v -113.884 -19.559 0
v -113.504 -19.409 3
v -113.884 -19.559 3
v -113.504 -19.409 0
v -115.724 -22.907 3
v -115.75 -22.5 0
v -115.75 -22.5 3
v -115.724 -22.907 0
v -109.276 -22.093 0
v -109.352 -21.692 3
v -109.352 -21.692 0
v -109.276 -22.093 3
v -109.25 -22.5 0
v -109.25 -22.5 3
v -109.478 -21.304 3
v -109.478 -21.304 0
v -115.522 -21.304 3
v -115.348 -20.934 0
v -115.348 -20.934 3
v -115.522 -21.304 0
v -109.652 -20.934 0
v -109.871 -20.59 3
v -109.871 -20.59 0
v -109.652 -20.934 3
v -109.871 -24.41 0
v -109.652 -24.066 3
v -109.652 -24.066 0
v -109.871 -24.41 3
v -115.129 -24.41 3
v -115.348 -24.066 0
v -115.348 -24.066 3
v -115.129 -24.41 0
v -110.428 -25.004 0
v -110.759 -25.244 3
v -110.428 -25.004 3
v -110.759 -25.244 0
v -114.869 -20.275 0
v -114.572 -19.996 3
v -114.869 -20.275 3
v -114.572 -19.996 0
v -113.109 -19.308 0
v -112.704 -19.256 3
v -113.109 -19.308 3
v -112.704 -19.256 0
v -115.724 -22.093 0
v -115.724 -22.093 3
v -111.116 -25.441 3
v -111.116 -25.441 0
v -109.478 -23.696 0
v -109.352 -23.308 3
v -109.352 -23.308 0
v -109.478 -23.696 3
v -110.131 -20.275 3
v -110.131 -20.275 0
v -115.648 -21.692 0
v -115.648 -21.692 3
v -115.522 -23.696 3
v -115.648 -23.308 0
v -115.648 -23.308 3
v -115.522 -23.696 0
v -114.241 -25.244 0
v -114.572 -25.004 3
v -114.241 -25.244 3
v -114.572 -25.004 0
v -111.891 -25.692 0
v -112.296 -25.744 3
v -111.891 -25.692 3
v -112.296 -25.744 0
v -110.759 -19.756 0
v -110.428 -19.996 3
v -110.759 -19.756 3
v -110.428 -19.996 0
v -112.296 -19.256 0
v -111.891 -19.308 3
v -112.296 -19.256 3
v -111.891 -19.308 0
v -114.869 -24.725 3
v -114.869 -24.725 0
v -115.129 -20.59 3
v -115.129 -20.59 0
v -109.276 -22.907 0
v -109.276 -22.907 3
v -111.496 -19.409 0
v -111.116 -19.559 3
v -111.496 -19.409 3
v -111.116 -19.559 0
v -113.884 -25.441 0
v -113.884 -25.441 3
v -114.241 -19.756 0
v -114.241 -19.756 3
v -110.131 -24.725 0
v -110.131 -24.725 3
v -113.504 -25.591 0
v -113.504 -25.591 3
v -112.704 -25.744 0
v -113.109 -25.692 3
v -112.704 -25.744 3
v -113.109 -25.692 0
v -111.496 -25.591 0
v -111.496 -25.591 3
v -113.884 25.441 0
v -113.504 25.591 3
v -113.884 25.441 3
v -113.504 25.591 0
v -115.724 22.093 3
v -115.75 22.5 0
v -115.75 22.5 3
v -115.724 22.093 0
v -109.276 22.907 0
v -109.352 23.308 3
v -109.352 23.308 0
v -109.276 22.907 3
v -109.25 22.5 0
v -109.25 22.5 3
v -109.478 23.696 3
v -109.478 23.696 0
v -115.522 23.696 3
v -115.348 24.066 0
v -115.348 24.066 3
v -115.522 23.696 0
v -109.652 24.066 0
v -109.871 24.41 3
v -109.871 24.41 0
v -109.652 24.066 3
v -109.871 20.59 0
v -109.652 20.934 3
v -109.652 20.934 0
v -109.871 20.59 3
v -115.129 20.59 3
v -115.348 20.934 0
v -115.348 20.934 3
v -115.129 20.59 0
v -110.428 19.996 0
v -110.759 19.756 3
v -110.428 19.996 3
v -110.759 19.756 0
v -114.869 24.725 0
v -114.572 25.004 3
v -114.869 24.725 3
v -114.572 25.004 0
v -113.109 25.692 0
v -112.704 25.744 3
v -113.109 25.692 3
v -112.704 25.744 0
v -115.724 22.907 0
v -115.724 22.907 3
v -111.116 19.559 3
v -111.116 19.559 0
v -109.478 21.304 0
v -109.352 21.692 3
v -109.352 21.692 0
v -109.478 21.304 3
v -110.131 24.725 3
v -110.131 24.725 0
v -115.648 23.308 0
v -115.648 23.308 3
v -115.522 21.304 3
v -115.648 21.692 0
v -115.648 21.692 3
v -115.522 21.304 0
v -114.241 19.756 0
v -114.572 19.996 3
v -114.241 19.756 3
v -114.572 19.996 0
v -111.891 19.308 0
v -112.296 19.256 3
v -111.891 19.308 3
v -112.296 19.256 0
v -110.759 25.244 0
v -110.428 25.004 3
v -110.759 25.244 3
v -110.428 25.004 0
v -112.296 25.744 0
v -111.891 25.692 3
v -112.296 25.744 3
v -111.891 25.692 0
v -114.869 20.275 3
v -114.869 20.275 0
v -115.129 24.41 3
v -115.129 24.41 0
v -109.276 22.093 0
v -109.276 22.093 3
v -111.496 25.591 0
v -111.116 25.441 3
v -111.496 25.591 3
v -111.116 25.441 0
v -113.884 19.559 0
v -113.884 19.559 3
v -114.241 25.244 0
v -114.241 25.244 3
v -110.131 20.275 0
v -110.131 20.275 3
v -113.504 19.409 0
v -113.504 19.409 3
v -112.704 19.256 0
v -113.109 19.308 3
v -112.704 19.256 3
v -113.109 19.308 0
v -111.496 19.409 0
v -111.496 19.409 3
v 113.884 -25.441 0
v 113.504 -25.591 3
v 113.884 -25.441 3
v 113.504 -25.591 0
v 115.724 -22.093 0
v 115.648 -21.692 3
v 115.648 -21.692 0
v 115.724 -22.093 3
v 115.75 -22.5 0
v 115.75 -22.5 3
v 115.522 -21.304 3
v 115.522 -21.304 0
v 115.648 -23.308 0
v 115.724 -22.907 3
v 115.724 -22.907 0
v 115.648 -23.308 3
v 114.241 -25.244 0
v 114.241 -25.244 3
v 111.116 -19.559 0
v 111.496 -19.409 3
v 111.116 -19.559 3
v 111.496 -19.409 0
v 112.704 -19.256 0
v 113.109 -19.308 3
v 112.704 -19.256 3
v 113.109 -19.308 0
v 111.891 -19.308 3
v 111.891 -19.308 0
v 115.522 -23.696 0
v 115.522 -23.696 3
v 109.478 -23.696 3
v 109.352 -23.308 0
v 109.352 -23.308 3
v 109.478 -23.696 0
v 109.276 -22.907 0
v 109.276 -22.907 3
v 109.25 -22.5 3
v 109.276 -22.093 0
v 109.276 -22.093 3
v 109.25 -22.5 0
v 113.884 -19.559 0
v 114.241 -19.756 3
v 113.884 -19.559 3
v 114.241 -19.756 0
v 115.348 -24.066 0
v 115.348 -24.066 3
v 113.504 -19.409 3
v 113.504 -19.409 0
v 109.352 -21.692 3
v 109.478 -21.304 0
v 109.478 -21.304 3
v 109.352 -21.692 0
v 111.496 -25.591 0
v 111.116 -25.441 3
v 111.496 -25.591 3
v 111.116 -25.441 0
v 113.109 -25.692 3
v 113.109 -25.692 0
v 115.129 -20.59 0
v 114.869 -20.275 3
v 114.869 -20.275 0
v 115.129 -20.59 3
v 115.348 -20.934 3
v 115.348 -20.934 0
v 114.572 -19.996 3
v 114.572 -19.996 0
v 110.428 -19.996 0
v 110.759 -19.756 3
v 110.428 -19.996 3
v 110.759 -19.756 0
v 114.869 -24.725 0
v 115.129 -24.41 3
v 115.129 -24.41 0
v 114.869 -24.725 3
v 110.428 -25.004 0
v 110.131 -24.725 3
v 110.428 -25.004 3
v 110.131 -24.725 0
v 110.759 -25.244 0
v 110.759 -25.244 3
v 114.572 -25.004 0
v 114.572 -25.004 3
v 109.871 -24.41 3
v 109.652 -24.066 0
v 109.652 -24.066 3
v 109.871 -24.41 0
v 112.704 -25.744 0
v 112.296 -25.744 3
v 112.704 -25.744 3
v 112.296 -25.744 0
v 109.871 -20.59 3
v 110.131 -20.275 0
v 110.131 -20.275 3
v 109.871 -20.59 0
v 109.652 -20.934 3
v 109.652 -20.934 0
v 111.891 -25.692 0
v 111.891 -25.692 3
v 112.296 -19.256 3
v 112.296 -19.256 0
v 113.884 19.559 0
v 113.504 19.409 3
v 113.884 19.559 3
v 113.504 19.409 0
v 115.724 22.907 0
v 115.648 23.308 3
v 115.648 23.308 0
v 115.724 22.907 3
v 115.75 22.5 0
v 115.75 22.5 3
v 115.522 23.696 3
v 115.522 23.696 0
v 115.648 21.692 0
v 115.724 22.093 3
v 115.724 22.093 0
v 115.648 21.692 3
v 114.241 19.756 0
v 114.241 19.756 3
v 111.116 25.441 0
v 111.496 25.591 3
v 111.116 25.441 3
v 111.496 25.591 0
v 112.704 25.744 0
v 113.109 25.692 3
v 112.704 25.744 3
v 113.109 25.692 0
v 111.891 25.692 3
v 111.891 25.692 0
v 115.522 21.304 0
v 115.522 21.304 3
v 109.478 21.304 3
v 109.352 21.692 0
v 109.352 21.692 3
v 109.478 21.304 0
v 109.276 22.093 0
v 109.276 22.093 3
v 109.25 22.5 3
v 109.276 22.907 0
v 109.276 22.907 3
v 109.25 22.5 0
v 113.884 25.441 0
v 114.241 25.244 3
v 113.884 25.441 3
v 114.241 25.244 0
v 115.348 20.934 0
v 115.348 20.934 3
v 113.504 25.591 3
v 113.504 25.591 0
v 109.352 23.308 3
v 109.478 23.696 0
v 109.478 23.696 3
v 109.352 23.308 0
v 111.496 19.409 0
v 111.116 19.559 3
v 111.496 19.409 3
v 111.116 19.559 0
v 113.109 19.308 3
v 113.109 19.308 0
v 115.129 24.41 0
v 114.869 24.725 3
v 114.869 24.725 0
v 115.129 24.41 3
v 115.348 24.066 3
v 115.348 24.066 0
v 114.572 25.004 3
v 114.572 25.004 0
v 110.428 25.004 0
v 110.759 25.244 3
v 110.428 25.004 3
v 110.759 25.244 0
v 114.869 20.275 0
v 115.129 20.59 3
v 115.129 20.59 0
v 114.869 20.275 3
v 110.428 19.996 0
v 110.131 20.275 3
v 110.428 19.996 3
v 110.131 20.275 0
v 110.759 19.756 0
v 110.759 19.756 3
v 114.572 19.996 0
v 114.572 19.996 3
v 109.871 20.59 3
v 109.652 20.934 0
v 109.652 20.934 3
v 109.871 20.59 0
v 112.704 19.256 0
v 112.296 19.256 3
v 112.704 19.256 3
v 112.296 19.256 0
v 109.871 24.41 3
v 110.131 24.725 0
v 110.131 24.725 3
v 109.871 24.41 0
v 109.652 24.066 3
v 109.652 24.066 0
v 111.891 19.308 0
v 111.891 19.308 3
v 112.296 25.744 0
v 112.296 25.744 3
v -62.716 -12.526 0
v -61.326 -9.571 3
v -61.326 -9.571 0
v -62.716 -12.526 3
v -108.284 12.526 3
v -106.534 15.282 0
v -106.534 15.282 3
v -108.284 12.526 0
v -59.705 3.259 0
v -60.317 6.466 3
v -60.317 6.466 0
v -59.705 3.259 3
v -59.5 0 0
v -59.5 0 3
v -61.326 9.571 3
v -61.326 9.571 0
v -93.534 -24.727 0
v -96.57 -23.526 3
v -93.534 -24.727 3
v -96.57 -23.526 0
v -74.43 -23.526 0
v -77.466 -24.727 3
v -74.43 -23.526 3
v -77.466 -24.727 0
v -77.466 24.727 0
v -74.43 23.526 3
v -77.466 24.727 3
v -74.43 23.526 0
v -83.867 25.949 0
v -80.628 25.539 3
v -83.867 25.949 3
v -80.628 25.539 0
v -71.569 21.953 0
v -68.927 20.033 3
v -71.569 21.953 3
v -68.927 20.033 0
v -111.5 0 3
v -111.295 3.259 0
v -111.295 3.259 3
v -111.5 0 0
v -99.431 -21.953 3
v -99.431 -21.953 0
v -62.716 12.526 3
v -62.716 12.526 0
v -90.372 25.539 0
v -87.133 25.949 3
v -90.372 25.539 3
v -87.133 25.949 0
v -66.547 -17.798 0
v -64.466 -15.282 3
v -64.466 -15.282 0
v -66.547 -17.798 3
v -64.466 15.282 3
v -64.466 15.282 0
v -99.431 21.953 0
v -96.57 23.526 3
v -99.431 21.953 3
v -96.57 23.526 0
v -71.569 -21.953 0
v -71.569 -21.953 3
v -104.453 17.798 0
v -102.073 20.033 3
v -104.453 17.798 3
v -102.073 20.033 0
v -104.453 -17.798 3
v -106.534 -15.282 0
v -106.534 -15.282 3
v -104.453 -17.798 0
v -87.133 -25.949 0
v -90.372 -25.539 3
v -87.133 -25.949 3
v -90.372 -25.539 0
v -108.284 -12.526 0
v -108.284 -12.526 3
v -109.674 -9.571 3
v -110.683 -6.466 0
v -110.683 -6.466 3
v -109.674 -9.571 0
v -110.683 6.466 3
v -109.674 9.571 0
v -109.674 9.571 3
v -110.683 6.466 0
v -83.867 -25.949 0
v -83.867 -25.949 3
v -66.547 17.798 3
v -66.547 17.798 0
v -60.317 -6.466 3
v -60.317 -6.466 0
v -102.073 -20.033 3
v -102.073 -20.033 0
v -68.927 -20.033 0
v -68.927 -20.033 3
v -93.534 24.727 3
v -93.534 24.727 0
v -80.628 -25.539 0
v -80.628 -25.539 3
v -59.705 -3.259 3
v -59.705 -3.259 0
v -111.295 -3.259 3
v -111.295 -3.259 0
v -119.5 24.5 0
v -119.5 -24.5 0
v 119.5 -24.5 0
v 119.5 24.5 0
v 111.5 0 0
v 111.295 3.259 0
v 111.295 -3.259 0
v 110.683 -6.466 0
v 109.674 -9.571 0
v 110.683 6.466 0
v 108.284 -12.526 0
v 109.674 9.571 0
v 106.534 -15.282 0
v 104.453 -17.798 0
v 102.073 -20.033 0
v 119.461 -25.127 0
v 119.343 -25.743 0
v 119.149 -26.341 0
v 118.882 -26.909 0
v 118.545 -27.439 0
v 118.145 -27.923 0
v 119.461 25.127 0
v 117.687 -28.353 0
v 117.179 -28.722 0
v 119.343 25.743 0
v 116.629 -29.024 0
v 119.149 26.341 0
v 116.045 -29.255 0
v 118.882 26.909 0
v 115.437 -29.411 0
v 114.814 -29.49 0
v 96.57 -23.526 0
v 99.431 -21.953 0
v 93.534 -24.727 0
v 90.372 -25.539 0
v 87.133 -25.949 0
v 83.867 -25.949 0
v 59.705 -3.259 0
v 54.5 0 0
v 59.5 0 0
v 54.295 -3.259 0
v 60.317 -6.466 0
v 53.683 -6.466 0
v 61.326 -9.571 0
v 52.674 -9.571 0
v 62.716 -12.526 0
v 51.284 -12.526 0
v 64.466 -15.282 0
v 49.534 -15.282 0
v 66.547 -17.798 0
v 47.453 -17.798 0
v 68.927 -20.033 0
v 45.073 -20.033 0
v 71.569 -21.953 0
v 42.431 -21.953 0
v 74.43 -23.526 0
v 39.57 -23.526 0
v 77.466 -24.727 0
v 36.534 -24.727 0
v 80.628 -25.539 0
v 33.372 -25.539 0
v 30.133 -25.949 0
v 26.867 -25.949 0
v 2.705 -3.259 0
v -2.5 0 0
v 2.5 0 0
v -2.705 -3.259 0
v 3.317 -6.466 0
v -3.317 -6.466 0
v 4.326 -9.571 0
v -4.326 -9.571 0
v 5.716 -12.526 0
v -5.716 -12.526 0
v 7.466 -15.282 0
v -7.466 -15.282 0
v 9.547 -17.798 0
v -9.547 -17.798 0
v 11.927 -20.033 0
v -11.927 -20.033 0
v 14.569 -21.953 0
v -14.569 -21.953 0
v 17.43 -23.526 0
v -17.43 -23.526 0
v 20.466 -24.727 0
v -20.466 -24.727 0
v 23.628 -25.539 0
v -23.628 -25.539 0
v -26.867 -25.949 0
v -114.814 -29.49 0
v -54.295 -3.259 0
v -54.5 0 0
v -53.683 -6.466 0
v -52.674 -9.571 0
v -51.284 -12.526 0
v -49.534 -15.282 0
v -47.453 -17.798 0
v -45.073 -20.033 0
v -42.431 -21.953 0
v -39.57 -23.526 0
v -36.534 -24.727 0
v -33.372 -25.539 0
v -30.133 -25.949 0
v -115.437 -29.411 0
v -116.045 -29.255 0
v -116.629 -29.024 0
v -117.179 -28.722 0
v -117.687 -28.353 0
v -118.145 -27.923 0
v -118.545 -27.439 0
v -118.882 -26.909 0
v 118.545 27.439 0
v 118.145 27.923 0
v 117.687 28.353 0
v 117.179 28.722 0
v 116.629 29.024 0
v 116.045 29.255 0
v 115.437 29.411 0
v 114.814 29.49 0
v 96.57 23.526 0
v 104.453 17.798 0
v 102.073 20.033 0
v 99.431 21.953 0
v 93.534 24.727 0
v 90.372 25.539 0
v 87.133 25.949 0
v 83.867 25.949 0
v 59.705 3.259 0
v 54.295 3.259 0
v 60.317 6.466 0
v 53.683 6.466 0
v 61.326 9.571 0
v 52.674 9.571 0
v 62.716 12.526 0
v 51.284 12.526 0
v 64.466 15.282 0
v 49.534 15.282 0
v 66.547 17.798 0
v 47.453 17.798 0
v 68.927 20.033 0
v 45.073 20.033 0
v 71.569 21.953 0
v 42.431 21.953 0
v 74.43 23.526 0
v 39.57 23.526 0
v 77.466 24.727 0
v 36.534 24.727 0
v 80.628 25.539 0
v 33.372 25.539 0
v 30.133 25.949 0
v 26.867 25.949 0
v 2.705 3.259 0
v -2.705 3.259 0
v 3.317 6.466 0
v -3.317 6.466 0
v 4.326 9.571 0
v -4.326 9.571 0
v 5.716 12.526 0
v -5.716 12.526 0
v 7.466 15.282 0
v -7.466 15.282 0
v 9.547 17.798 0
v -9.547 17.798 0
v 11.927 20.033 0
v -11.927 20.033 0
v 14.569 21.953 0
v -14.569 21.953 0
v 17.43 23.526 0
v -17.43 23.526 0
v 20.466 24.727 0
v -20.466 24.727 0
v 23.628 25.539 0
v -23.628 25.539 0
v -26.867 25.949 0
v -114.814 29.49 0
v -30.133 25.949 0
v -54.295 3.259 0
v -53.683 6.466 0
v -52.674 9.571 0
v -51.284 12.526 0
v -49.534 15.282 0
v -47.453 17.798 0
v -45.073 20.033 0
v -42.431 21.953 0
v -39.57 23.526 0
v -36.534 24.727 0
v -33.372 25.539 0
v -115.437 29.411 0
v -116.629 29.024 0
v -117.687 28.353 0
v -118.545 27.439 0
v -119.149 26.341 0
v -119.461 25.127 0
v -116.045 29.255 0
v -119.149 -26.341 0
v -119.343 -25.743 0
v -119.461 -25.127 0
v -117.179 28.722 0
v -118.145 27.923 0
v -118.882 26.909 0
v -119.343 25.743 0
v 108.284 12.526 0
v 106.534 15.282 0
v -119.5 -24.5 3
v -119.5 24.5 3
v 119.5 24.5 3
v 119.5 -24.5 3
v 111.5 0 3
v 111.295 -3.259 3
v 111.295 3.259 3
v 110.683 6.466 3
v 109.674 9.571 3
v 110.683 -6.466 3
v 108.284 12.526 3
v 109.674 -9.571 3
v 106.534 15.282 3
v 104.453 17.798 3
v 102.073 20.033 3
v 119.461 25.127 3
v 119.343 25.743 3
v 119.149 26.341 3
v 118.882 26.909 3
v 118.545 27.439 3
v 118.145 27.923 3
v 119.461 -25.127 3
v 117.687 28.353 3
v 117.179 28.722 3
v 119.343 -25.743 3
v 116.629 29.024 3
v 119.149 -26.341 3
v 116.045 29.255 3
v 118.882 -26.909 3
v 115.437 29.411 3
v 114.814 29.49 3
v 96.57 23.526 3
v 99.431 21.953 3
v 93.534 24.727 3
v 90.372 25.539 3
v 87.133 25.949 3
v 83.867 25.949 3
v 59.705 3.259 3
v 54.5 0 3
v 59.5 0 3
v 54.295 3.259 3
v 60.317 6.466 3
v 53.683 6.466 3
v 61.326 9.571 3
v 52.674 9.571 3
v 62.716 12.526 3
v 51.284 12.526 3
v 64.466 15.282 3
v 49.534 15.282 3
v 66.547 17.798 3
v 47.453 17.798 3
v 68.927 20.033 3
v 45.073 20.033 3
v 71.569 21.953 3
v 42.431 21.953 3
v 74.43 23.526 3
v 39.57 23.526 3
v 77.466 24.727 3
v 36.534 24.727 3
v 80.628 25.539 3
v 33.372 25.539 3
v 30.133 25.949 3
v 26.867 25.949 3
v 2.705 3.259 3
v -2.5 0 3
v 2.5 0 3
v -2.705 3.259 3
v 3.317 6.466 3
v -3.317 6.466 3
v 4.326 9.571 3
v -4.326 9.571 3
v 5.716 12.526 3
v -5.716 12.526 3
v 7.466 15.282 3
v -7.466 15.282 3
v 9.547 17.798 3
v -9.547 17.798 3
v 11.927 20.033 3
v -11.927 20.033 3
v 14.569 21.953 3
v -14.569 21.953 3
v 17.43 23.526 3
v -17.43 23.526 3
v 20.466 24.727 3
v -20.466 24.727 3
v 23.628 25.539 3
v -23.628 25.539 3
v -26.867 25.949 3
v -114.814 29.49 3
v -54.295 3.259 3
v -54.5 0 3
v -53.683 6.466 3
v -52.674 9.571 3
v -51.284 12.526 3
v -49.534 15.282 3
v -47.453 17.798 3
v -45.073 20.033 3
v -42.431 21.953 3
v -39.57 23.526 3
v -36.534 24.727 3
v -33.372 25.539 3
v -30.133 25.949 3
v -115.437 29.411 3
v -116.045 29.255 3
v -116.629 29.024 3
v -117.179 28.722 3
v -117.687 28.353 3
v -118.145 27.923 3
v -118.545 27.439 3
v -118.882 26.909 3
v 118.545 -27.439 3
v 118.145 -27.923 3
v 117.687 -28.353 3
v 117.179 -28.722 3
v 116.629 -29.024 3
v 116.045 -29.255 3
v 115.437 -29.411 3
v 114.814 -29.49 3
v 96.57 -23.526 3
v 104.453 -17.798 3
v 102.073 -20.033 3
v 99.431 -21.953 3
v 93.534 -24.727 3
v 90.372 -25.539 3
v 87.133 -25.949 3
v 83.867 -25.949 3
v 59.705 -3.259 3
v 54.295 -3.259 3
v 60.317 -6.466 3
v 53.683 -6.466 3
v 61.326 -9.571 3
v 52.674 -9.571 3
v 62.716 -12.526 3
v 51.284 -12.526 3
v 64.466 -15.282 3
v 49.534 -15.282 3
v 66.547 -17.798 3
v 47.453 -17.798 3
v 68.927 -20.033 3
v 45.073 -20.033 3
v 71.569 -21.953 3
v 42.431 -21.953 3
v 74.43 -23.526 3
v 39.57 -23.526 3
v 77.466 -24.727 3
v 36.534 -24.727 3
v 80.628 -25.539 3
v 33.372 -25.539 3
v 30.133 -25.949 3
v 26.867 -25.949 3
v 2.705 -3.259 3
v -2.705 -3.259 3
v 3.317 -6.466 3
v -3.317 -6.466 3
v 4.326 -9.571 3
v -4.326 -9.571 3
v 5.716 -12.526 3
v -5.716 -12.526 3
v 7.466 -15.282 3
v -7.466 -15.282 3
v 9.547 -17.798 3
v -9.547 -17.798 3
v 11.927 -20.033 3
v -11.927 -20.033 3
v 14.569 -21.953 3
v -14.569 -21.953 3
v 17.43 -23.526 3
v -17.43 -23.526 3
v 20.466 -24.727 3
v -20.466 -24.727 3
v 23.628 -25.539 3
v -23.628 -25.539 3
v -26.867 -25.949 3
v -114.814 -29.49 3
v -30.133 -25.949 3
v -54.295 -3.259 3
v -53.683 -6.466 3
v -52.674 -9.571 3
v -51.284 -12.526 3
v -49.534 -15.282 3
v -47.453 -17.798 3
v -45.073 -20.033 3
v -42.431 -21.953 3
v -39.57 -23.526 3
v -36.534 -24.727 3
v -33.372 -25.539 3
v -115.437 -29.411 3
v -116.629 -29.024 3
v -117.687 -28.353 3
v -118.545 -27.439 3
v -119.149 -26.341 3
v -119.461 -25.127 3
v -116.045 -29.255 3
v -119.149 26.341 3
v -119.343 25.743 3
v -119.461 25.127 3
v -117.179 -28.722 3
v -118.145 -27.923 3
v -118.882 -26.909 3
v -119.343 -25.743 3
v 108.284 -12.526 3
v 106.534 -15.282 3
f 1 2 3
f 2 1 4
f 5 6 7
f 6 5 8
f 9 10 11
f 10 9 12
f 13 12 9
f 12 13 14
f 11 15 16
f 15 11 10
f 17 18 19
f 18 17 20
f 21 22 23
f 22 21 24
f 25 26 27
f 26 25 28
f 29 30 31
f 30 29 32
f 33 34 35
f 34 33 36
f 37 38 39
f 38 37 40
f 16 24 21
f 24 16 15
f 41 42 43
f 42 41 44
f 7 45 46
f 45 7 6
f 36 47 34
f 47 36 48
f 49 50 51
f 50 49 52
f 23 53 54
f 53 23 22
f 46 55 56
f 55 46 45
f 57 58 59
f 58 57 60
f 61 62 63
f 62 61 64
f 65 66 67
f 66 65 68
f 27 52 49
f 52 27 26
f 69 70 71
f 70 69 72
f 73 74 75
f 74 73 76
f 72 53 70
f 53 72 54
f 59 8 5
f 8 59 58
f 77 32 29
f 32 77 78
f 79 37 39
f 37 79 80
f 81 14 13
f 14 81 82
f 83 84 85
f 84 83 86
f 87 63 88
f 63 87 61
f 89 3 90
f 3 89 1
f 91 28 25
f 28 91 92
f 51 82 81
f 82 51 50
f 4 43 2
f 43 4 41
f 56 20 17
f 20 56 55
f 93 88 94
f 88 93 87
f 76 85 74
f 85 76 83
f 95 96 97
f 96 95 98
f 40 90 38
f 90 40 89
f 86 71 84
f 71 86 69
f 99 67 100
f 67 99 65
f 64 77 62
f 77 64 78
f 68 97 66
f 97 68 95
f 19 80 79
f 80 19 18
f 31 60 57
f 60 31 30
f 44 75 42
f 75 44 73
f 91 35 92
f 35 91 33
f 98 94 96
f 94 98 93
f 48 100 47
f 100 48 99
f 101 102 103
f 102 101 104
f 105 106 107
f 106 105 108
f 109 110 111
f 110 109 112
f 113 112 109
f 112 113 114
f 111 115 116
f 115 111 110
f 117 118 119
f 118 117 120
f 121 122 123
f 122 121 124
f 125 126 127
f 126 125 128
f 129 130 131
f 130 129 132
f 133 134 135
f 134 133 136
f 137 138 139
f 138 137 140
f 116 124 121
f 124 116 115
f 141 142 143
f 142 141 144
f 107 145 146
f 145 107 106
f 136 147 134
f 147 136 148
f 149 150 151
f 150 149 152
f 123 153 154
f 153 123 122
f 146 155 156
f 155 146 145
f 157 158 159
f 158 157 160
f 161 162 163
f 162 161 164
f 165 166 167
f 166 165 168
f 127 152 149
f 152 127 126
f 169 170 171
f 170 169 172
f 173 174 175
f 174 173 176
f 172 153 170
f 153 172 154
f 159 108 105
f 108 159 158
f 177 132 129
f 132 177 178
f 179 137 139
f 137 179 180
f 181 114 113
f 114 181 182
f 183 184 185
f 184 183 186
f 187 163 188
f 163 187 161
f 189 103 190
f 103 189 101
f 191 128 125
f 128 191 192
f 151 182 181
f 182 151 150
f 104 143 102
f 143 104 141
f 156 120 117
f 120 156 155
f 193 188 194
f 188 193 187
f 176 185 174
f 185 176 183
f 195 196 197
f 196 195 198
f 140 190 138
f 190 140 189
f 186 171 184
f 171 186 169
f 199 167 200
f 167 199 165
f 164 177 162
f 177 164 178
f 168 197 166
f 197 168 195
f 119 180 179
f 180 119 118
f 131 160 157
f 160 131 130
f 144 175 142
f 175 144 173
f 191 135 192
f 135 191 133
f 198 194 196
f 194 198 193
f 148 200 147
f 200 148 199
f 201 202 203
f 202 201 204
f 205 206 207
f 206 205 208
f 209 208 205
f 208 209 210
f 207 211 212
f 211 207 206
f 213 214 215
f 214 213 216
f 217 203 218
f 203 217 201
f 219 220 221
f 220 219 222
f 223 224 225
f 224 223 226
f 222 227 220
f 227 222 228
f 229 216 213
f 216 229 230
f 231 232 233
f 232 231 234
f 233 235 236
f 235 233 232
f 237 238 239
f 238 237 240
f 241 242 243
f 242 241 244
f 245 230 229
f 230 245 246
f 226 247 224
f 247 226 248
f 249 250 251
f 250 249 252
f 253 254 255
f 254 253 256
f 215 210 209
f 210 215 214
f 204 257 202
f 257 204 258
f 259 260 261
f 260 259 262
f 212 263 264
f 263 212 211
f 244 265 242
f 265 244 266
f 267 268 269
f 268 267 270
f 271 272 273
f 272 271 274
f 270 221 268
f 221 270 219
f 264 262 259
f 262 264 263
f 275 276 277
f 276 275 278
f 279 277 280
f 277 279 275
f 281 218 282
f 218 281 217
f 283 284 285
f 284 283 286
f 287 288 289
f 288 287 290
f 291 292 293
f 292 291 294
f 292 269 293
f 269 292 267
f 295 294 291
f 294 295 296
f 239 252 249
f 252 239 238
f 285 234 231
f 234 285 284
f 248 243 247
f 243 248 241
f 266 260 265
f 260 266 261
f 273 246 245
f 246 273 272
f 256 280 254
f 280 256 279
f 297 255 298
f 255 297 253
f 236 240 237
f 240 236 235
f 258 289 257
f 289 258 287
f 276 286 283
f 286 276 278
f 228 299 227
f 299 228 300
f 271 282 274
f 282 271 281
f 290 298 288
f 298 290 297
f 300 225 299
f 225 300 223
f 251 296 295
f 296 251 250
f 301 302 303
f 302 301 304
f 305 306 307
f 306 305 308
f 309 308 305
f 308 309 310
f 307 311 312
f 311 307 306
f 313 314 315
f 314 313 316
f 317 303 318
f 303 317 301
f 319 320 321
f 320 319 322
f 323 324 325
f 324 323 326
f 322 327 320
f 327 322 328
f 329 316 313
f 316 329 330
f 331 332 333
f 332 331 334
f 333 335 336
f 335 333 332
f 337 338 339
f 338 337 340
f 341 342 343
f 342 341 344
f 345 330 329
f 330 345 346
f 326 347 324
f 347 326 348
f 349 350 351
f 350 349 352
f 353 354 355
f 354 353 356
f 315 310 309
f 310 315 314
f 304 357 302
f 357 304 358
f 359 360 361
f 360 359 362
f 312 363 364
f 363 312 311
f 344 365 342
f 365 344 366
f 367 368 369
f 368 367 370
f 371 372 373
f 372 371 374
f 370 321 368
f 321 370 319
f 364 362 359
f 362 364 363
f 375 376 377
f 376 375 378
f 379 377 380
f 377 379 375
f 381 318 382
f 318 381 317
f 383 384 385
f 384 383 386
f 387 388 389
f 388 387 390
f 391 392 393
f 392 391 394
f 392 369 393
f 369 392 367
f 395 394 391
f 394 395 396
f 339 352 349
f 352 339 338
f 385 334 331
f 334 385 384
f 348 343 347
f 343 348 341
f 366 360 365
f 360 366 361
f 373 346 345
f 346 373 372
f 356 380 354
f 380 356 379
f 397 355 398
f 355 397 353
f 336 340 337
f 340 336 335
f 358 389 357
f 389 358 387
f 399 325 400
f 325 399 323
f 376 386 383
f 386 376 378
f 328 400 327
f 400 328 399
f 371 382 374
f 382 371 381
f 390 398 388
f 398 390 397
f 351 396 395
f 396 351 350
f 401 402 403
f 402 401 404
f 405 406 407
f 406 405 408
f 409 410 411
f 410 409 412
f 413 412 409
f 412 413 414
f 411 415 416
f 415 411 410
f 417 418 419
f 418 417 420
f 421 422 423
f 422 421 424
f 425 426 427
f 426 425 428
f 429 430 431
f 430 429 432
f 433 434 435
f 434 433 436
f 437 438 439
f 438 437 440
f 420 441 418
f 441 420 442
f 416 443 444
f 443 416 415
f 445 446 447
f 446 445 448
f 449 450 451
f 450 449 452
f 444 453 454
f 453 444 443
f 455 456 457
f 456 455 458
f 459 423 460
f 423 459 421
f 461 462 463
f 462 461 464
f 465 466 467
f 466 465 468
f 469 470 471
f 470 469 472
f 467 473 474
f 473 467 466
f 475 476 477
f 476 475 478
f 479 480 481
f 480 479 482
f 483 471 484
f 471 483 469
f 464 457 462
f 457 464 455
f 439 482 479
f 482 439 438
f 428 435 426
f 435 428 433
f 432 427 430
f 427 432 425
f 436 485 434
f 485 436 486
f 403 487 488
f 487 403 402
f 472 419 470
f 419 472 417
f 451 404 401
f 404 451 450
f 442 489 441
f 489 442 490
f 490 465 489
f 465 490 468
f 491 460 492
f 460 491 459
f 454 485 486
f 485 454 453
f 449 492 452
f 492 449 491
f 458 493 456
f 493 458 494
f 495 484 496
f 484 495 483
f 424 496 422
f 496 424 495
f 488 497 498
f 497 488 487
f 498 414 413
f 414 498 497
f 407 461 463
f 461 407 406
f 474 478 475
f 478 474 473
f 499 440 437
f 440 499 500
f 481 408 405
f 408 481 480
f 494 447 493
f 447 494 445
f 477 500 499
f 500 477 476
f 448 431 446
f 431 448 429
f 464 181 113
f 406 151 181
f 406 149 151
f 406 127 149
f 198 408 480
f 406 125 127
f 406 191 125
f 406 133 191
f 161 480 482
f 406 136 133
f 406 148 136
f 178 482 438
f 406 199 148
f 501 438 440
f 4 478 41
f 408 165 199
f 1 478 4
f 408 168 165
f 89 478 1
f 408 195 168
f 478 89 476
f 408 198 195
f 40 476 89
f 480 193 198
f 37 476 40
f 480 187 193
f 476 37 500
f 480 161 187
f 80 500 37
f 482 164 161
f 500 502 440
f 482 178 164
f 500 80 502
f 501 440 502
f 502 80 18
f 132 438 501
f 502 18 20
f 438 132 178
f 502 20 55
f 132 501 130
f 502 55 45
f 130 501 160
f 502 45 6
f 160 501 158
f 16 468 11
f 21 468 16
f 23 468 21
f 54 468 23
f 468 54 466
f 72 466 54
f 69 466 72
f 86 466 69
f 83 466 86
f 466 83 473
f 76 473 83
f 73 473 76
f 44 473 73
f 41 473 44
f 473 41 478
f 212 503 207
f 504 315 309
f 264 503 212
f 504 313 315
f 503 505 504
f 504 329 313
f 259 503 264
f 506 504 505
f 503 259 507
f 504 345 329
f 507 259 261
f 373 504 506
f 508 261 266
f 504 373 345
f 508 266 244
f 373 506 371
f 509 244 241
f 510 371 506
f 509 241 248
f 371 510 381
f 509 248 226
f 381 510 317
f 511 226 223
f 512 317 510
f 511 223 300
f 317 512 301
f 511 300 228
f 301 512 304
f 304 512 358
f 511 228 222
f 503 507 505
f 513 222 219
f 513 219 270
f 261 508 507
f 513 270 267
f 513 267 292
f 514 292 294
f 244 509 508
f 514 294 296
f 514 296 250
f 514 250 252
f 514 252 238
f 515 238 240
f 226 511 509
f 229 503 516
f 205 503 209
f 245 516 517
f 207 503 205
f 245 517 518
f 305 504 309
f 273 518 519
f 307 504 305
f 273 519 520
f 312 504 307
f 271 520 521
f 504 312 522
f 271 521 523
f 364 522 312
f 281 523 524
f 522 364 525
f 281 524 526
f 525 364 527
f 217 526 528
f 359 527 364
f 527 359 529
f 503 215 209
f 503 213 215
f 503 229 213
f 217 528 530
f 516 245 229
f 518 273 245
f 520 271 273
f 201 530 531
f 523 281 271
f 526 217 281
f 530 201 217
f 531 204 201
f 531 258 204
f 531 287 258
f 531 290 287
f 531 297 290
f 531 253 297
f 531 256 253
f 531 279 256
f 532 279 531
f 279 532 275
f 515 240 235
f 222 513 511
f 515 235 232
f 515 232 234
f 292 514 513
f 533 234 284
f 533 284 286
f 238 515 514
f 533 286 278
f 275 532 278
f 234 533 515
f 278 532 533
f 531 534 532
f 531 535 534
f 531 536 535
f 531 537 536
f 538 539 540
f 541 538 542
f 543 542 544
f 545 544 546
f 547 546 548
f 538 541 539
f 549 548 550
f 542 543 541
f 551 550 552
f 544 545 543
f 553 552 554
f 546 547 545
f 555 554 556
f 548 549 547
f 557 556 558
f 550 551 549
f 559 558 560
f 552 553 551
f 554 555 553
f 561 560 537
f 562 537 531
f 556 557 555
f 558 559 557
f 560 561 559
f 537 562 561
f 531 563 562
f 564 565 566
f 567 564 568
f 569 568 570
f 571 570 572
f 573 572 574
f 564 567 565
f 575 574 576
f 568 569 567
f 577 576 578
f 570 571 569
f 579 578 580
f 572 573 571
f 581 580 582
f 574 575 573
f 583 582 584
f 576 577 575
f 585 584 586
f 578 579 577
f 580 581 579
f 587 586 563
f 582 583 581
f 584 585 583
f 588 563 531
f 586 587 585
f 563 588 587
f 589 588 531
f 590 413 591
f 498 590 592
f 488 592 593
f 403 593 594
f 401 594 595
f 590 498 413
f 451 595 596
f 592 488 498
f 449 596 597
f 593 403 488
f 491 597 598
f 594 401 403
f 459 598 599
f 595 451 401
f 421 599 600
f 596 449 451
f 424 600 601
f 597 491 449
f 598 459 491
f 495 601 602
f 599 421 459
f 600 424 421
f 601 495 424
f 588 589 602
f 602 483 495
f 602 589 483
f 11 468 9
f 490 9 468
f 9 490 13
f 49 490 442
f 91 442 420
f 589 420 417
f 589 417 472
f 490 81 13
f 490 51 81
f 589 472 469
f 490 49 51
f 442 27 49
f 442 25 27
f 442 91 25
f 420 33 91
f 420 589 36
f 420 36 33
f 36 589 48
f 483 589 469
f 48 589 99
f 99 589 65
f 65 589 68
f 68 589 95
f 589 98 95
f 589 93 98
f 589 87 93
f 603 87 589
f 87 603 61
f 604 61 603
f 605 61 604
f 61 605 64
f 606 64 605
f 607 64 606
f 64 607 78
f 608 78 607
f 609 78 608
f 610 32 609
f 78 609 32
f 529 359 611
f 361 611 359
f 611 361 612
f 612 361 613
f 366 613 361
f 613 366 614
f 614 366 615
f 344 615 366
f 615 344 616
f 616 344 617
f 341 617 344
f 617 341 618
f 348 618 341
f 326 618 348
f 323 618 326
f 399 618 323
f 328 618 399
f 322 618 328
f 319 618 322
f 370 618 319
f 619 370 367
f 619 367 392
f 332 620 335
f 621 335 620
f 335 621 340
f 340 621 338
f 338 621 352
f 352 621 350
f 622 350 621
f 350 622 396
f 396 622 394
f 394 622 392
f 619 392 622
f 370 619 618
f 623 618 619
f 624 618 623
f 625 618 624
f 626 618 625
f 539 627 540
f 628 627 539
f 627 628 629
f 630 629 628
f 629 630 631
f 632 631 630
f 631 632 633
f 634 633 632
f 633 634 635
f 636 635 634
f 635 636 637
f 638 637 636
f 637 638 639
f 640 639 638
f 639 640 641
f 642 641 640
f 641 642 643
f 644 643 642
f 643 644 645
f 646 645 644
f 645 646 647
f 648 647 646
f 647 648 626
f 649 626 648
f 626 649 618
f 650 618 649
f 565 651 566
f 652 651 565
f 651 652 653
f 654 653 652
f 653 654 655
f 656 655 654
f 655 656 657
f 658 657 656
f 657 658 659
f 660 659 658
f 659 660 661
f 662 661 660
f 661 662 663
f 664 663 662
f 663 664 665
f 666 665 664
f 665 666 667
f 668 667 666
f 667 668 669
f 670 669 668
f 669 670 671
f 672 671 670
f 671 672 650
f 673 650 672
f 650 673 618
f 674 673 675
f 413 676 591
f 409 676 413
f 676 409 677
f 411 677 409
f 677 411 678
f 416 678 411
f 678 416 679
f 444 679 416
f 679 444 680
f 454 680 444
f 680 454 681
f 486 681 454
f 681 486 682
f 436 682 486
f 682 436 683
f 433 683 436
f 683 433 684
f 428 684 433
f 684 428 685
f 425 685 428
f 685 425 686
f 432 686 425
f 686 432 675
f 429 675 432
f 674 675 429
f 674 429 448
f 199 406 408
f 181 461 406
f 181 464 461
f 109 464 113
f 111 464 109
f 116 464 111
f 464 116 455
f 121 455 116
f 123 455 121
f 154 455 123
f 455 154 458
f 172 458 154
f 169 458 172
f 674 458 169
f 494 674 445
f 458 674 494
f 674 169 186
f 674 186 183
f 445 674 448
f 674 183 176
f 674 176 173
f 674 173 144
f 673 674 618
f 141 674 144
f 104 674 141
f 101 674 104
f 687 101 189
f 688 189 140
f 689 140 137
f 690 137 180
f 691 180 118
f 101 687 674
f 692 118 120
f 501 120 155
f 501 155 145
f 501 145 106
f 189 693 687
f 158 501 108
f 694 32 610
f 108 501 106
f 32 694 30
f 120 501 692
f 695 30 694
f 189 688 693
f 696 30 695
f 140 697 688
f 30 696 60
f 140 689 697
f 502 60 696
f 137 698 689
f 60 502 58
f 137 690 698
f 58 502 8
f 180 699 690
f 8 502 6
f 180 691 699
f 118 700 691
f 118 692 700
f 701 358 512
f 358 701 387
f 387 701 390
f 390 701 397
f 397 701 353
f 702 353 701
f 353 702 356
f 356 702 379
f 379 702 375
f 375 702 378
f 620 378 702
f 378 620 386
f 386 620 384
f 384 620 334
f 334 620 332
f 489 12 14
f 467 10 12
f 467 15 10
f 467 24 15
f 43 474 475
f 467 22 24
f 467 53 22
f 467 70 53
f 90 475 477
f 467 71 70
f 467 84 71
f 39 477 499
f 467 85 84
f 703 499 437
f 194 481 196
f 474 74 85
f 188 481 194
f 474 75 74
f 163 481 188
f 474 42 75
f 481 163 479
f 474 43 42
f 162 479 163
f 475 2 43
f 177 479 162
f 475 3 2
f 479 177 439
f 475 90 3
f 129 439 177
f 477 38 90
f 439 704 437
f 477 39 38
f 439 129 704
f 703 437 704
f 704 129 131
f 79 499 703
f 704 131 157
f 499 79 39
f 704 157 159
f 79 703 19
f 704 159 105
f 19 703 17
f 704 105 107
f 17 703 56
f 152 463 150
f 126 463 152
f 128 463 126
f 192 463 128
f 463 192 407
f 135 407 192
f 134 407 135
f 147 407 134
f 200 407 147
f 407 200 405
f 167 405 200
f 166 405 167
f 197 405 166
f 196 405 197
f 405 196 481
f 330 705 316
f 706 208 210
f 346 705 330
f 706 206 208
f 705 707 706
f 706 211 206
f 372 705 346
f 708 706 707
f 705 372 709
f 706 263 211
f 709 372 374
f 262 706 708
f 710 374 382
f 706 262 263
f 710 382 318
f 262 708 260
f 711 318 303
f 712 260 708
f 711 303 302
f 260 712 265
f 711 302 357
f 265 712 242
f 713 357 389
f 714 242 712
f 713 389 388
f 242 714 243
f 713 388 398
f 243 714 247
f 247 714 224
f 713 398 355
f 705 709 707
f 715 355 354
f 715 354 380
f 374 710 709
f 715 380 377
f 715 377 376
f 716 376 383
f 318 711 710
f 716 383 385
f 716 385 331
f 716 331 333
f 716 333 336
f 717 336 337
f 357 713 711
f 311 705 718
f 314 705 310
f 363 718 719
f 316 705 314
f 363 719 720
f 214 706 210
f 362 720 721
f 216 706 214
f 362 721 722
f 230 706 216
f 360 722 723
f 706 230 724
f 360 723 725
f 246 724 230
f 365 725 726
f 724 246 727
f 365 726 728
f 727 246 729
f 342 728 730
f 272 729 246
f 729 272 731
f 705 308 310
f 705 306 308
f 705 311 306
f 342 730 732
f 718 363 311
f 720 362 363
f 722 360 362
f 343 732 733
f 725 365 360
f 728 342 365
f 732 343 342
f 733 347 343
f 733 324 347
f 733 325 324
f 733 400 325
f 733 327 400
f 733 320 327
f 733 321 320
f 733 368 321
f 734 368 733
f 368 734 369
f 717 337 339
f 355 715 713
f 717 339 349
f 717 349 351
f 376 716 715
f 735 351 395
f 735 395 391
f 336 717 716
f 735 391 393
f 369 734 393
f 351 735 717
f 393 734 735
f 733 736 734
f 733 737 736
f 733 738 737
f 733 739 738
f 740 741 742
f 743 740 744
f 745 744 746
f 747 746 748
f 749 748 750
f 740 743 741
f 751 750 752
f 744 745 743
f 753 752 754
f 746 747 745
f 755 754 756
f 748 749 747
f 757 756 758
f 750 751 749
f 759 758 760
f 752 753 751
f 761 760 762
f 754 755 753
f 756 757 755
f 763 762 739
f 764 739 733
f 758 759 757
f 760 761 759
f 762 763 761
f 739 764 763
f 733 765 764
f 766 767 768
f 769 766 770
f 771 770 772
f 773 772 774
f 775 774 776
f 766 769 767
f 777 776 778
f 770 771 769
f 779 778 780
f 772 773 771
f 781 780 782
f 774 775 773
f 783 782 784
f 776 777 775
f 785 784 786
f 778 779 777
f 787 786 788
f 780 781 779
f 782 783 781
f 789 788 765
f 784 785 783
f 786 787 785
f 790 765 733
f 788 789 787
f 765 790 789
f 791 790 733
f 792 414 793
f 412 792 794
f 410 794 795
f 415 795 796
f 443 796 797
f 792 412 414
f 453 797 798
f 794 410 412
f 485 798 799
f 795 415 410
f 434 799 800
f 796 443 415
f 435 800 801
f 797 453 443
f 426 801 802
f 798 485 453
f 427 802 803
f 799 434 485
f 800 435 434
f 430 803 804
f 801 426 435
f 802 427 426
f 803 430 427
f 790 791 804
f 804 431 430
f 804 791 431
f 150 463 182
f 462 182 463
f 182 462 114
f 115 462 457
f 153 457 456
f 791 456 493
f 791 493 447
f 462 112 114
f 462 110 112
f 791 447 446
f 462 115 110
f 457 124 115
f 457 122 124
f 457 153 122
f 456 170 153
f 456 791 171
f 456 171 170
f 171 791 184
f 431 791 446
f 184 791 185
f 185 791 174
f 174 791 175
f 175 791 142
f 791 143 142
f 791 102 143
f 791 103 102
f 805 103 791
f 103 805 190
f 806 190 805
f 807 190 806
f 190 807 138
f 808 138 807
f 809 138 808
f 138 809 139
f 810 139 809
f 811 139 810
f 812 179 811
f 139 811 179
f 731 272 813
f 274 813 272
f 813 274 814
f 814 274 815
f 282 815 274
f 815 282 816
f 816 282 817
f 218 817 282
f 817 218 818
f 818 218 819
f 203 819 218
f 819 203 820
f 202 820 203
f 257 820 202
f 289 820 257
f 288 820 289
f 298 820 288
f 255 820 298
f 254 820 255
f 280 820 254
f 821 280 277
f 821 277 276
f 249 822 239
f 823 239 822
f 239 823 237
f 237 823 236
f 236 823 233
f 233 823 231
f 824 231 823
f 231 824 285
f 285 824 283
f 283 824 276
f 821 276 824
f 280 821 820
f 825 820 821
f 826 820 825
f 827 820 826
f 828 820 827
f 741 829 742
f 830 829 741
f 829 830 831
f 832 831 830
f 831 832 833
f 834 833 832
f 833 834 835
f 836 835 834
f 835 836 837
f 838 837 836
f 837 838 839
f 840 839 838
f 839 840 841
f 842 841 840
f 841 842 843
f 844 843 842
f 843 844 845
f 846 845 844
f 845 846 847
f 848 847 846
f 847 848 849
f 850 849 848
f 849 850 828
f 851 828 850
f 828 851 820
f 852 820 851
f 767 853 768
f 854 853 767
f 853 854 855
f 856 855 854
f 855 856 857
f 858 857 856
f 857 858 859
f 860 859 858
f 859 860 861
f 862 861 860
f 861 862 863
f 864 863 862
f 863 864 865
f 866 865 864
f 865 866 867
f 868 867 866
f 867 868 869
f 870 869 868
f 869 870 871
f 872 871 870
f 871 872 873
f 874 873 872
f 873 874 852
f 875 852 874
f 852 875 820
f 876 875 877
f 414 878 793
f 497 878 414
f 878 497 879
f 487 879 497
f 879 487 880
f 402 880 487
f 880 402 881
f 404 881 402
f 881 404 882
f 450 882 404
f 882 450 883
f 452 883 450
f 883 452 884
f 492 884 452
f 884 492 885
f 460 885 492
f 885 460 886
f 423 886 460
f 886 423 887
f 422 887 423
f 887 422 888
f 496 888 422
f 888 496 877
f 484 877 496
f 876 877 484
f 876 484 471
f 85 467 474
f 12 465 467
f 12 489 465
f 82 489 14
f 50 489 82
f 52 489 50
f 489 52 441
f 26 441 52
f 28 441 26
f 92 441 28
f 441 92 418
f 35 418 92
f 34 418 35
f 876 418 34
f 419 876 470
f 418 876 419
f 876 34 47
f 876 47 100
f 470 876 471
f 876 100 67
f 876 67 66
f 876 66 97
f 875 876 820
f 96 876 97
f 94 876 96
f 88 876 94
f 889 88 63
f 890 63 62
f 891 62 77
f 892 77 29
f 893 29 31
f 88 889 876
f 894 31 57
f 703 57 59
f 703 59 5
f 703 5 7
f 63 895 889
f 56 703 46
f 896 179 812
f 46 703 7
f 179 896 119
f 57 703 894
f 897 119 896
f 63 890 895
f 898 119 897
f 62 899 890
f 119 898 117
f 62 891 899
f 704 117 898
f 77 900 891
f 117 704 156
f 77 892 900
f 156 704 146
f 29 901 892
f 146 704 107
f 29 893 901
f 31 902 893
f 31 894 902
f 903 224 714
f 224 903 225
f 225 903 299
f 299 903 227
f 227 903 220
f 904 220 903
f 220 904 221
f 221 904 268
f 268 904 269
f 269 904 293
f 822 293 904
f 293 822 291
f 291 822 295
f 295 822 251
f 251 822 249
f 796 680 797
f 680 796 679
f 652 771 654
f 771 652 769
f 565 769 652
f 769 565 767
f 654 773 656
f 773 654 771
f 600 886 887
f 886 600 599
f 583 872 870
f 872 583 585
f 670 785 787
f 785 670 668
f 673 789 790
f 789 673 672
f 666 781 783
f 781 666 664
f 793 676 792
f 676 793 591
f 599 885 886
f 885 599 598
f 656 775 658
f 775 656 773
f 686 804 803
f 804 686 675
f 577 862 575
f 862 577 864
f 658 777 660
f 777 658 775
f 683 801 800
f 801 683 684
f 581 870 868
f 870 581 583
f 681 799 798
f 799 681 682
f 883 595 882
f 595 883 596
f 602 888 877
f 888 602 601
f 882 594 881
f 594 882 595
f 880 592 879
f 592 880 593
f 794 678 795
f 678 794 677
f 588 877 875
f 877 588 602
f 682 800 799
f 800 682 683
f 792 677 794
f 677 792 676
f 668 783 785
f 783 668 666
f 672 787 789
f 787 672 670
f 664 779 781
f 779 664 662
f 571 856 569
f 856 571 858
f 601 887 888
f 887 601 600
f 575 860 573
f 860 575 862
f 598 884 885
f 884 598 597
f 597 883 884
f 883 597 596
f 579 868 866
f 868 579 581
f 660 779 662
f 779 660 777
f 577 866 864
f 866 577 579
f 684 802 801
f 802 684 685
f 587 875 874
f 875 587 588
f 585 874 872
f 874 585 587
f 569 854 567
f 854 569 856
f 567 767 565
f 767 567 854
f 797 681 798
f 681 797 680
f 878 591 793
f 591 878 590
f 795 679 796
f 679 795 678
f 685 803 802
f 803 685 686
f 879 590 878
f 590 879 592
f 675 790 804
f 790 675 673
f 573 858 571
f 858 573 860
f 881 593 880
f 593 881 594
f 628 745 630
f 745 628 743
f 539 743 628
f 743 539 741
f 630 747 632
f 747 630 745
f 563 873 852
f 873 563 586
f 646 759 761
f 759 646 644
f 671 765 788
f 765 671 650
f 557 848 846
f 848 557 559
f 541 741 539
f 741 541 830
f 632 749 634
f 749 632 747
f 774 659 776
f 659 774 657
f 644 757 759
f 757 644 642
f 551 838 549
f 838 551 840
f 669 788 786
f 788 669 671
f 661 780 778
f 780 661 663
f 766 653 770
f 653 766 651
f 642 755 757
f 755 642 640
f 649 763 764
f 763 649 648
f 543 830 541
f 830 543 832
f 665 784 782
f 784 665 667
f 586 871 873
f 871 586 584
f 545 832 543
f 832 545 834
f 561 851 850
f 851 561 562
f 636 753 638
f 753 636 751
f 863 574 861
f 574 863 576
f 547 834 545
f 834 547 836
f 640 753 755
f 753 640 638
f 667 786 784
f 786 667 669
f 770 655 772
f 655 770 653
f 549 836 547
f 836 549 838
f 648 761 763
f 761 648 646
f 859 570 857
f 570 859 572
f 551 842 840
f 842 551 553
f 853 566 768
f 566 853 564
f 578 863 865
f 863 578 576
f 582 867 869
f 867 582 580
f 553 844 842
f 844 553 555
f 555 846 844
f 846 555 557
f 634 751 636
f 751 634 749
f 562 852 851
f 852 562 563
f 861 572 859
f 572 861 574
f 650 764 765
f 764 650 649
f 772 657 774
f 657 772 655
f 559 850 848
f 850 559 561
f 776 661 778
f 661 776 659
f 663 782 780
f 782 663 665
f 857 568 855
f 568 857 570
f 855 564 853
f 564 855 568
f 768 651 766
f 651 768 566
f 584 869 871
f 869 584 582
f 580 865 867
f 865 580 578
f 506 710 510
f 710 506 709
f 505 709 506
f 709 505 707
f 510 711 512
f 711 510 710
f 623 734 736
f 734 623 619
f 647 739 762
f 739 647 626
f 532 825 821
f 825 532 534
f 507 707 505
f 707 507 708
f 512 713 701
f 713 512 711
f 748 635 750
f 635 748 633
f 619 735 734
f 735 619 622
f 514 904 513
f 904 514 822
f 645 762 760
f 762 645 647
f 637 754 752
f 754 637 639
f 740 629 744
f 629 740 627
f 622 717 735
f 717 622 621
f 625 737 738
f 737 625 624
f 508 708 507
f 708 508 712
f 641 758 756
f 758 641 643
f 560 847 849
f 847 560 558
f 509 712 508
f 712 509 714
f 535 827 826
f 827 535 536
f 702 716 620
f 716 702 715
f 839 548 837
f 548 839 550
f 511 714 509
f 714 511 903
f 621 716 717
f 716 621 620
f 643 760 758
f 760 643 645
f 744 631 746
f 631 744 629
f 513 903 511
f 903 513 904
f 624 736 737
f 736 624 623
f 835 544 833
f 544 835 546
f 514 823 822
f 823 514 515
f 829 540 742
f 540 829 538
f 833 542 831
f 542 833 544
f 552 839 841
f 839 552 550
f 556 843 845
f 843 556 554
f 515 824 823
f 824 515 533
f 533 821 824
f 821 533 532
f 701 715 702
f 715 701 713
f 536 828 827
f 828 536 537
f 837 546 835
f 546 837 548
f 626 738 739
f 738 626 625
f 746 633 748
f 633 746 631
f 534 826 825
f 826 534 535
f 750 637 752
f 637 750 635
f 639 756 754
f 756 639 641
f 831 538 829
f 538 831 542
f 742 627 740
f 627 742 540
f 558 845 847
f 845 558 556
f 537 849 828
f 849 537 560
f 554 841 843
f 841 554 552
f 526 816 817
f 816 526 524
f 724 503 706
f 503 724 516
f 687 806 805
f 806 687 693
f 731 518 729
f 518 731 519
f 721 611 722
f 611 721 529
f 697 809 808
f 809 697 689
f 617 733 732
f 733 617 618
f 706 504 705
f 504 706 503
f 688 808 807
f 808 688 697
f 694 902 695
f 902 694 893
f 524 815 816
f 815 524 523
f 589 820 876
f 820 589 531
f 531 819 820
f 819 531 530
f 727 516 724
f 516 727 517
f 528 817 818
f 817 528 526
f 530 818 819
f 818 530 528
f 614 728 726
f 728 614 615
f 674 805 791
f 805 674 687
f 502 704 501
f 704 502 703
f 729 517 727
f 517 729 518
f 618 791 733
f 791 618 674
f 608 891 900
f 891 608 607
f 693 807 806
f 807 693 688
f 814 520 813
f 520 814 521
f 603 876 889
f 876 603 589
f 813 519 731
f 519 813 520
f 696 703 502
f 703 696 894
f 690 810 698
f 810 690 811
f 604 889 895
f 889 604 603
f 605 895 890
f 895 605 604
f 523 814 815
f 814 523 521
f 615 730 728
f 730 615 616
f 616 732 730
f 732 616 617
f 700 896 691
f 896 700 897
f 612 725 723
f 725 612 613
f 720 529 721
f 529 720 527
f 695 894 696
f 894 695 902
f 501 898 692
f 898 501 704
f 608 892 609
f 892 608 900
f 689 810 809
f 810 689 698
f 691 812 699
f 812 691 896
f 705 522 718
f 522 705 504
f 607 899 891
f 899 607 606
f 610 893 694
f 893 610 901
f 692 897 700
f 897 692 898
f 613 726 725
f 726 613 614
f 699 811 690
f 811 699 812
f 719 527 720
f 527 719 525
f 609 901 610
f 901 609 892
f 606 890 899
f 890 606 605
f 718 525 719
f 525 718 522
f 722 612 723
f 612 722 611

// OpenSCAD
$fn = 50;

difference() {
	union() {
		hull() {
			translate(v = [-114.5, 24.5, 0]) {
				cylinder(h = 3, r = 5);
			}
			translate(v = [114.5, 24.5, 0]) {
				cylinder(h = 3, r = 5);
			}
			translate(v = [-114.5, -24.5, 0]) {
				cylinder(h = 3, r = 5);
			}
			translate(v = [114.5, -24.5, 0]) {
				cylinder(h = 3, r = 5);
			}
		}
	}
	union() {
		translate(v = [-112.5, -22.5, -100.0]) {
			cylinder(h = 200, r = 3.25);
		}
		translate(v = [-112.5, 22.5, -100.0]) {
			cylinder(h = 200, r = 3.25);
		}
		translate(v = [112.5, -22.5, -100.0]) {
			cylinder(h = 200, r = 3.25);
		}
		translate(v = [112.5, 22.5, -100.0]) {
			cylinder(h = 200, r = 3.25);
		}
		translate(v = [-112.5, -22.5, -100.0]) {
			cylinder(h = 200, r = 1.8);
		}
		translate(v = [-112.5, 22.5, -100.0]) {
			cylinder(h = 200, r = 1.8);
		}
		translate(v = [112.5, -22.5, -100.0]) {
			cylinder(h = 200, r = 1.8);
		}
		translate(v = [112.5, 22.5, -100.0]) {
			cylinder(h = 200, r = 1.8);
		}
		translate(v = [-85.5, 0, 0.0]) {
			cylinder(h = 3, r = 26.0);
		}
		translate(v = [-28.5, 0, 0.0]) {
			cylinder(h = 3, r = 26.0);
		}
		translate(v = [28.5, 0, 0.0]) {
			cylinder(h = 3, r = 26.0);
		}
		translate(v = [85.5, 0, 0.0]) {
			cylinder(h = 3, r = 26.0);
		}
	}
}
